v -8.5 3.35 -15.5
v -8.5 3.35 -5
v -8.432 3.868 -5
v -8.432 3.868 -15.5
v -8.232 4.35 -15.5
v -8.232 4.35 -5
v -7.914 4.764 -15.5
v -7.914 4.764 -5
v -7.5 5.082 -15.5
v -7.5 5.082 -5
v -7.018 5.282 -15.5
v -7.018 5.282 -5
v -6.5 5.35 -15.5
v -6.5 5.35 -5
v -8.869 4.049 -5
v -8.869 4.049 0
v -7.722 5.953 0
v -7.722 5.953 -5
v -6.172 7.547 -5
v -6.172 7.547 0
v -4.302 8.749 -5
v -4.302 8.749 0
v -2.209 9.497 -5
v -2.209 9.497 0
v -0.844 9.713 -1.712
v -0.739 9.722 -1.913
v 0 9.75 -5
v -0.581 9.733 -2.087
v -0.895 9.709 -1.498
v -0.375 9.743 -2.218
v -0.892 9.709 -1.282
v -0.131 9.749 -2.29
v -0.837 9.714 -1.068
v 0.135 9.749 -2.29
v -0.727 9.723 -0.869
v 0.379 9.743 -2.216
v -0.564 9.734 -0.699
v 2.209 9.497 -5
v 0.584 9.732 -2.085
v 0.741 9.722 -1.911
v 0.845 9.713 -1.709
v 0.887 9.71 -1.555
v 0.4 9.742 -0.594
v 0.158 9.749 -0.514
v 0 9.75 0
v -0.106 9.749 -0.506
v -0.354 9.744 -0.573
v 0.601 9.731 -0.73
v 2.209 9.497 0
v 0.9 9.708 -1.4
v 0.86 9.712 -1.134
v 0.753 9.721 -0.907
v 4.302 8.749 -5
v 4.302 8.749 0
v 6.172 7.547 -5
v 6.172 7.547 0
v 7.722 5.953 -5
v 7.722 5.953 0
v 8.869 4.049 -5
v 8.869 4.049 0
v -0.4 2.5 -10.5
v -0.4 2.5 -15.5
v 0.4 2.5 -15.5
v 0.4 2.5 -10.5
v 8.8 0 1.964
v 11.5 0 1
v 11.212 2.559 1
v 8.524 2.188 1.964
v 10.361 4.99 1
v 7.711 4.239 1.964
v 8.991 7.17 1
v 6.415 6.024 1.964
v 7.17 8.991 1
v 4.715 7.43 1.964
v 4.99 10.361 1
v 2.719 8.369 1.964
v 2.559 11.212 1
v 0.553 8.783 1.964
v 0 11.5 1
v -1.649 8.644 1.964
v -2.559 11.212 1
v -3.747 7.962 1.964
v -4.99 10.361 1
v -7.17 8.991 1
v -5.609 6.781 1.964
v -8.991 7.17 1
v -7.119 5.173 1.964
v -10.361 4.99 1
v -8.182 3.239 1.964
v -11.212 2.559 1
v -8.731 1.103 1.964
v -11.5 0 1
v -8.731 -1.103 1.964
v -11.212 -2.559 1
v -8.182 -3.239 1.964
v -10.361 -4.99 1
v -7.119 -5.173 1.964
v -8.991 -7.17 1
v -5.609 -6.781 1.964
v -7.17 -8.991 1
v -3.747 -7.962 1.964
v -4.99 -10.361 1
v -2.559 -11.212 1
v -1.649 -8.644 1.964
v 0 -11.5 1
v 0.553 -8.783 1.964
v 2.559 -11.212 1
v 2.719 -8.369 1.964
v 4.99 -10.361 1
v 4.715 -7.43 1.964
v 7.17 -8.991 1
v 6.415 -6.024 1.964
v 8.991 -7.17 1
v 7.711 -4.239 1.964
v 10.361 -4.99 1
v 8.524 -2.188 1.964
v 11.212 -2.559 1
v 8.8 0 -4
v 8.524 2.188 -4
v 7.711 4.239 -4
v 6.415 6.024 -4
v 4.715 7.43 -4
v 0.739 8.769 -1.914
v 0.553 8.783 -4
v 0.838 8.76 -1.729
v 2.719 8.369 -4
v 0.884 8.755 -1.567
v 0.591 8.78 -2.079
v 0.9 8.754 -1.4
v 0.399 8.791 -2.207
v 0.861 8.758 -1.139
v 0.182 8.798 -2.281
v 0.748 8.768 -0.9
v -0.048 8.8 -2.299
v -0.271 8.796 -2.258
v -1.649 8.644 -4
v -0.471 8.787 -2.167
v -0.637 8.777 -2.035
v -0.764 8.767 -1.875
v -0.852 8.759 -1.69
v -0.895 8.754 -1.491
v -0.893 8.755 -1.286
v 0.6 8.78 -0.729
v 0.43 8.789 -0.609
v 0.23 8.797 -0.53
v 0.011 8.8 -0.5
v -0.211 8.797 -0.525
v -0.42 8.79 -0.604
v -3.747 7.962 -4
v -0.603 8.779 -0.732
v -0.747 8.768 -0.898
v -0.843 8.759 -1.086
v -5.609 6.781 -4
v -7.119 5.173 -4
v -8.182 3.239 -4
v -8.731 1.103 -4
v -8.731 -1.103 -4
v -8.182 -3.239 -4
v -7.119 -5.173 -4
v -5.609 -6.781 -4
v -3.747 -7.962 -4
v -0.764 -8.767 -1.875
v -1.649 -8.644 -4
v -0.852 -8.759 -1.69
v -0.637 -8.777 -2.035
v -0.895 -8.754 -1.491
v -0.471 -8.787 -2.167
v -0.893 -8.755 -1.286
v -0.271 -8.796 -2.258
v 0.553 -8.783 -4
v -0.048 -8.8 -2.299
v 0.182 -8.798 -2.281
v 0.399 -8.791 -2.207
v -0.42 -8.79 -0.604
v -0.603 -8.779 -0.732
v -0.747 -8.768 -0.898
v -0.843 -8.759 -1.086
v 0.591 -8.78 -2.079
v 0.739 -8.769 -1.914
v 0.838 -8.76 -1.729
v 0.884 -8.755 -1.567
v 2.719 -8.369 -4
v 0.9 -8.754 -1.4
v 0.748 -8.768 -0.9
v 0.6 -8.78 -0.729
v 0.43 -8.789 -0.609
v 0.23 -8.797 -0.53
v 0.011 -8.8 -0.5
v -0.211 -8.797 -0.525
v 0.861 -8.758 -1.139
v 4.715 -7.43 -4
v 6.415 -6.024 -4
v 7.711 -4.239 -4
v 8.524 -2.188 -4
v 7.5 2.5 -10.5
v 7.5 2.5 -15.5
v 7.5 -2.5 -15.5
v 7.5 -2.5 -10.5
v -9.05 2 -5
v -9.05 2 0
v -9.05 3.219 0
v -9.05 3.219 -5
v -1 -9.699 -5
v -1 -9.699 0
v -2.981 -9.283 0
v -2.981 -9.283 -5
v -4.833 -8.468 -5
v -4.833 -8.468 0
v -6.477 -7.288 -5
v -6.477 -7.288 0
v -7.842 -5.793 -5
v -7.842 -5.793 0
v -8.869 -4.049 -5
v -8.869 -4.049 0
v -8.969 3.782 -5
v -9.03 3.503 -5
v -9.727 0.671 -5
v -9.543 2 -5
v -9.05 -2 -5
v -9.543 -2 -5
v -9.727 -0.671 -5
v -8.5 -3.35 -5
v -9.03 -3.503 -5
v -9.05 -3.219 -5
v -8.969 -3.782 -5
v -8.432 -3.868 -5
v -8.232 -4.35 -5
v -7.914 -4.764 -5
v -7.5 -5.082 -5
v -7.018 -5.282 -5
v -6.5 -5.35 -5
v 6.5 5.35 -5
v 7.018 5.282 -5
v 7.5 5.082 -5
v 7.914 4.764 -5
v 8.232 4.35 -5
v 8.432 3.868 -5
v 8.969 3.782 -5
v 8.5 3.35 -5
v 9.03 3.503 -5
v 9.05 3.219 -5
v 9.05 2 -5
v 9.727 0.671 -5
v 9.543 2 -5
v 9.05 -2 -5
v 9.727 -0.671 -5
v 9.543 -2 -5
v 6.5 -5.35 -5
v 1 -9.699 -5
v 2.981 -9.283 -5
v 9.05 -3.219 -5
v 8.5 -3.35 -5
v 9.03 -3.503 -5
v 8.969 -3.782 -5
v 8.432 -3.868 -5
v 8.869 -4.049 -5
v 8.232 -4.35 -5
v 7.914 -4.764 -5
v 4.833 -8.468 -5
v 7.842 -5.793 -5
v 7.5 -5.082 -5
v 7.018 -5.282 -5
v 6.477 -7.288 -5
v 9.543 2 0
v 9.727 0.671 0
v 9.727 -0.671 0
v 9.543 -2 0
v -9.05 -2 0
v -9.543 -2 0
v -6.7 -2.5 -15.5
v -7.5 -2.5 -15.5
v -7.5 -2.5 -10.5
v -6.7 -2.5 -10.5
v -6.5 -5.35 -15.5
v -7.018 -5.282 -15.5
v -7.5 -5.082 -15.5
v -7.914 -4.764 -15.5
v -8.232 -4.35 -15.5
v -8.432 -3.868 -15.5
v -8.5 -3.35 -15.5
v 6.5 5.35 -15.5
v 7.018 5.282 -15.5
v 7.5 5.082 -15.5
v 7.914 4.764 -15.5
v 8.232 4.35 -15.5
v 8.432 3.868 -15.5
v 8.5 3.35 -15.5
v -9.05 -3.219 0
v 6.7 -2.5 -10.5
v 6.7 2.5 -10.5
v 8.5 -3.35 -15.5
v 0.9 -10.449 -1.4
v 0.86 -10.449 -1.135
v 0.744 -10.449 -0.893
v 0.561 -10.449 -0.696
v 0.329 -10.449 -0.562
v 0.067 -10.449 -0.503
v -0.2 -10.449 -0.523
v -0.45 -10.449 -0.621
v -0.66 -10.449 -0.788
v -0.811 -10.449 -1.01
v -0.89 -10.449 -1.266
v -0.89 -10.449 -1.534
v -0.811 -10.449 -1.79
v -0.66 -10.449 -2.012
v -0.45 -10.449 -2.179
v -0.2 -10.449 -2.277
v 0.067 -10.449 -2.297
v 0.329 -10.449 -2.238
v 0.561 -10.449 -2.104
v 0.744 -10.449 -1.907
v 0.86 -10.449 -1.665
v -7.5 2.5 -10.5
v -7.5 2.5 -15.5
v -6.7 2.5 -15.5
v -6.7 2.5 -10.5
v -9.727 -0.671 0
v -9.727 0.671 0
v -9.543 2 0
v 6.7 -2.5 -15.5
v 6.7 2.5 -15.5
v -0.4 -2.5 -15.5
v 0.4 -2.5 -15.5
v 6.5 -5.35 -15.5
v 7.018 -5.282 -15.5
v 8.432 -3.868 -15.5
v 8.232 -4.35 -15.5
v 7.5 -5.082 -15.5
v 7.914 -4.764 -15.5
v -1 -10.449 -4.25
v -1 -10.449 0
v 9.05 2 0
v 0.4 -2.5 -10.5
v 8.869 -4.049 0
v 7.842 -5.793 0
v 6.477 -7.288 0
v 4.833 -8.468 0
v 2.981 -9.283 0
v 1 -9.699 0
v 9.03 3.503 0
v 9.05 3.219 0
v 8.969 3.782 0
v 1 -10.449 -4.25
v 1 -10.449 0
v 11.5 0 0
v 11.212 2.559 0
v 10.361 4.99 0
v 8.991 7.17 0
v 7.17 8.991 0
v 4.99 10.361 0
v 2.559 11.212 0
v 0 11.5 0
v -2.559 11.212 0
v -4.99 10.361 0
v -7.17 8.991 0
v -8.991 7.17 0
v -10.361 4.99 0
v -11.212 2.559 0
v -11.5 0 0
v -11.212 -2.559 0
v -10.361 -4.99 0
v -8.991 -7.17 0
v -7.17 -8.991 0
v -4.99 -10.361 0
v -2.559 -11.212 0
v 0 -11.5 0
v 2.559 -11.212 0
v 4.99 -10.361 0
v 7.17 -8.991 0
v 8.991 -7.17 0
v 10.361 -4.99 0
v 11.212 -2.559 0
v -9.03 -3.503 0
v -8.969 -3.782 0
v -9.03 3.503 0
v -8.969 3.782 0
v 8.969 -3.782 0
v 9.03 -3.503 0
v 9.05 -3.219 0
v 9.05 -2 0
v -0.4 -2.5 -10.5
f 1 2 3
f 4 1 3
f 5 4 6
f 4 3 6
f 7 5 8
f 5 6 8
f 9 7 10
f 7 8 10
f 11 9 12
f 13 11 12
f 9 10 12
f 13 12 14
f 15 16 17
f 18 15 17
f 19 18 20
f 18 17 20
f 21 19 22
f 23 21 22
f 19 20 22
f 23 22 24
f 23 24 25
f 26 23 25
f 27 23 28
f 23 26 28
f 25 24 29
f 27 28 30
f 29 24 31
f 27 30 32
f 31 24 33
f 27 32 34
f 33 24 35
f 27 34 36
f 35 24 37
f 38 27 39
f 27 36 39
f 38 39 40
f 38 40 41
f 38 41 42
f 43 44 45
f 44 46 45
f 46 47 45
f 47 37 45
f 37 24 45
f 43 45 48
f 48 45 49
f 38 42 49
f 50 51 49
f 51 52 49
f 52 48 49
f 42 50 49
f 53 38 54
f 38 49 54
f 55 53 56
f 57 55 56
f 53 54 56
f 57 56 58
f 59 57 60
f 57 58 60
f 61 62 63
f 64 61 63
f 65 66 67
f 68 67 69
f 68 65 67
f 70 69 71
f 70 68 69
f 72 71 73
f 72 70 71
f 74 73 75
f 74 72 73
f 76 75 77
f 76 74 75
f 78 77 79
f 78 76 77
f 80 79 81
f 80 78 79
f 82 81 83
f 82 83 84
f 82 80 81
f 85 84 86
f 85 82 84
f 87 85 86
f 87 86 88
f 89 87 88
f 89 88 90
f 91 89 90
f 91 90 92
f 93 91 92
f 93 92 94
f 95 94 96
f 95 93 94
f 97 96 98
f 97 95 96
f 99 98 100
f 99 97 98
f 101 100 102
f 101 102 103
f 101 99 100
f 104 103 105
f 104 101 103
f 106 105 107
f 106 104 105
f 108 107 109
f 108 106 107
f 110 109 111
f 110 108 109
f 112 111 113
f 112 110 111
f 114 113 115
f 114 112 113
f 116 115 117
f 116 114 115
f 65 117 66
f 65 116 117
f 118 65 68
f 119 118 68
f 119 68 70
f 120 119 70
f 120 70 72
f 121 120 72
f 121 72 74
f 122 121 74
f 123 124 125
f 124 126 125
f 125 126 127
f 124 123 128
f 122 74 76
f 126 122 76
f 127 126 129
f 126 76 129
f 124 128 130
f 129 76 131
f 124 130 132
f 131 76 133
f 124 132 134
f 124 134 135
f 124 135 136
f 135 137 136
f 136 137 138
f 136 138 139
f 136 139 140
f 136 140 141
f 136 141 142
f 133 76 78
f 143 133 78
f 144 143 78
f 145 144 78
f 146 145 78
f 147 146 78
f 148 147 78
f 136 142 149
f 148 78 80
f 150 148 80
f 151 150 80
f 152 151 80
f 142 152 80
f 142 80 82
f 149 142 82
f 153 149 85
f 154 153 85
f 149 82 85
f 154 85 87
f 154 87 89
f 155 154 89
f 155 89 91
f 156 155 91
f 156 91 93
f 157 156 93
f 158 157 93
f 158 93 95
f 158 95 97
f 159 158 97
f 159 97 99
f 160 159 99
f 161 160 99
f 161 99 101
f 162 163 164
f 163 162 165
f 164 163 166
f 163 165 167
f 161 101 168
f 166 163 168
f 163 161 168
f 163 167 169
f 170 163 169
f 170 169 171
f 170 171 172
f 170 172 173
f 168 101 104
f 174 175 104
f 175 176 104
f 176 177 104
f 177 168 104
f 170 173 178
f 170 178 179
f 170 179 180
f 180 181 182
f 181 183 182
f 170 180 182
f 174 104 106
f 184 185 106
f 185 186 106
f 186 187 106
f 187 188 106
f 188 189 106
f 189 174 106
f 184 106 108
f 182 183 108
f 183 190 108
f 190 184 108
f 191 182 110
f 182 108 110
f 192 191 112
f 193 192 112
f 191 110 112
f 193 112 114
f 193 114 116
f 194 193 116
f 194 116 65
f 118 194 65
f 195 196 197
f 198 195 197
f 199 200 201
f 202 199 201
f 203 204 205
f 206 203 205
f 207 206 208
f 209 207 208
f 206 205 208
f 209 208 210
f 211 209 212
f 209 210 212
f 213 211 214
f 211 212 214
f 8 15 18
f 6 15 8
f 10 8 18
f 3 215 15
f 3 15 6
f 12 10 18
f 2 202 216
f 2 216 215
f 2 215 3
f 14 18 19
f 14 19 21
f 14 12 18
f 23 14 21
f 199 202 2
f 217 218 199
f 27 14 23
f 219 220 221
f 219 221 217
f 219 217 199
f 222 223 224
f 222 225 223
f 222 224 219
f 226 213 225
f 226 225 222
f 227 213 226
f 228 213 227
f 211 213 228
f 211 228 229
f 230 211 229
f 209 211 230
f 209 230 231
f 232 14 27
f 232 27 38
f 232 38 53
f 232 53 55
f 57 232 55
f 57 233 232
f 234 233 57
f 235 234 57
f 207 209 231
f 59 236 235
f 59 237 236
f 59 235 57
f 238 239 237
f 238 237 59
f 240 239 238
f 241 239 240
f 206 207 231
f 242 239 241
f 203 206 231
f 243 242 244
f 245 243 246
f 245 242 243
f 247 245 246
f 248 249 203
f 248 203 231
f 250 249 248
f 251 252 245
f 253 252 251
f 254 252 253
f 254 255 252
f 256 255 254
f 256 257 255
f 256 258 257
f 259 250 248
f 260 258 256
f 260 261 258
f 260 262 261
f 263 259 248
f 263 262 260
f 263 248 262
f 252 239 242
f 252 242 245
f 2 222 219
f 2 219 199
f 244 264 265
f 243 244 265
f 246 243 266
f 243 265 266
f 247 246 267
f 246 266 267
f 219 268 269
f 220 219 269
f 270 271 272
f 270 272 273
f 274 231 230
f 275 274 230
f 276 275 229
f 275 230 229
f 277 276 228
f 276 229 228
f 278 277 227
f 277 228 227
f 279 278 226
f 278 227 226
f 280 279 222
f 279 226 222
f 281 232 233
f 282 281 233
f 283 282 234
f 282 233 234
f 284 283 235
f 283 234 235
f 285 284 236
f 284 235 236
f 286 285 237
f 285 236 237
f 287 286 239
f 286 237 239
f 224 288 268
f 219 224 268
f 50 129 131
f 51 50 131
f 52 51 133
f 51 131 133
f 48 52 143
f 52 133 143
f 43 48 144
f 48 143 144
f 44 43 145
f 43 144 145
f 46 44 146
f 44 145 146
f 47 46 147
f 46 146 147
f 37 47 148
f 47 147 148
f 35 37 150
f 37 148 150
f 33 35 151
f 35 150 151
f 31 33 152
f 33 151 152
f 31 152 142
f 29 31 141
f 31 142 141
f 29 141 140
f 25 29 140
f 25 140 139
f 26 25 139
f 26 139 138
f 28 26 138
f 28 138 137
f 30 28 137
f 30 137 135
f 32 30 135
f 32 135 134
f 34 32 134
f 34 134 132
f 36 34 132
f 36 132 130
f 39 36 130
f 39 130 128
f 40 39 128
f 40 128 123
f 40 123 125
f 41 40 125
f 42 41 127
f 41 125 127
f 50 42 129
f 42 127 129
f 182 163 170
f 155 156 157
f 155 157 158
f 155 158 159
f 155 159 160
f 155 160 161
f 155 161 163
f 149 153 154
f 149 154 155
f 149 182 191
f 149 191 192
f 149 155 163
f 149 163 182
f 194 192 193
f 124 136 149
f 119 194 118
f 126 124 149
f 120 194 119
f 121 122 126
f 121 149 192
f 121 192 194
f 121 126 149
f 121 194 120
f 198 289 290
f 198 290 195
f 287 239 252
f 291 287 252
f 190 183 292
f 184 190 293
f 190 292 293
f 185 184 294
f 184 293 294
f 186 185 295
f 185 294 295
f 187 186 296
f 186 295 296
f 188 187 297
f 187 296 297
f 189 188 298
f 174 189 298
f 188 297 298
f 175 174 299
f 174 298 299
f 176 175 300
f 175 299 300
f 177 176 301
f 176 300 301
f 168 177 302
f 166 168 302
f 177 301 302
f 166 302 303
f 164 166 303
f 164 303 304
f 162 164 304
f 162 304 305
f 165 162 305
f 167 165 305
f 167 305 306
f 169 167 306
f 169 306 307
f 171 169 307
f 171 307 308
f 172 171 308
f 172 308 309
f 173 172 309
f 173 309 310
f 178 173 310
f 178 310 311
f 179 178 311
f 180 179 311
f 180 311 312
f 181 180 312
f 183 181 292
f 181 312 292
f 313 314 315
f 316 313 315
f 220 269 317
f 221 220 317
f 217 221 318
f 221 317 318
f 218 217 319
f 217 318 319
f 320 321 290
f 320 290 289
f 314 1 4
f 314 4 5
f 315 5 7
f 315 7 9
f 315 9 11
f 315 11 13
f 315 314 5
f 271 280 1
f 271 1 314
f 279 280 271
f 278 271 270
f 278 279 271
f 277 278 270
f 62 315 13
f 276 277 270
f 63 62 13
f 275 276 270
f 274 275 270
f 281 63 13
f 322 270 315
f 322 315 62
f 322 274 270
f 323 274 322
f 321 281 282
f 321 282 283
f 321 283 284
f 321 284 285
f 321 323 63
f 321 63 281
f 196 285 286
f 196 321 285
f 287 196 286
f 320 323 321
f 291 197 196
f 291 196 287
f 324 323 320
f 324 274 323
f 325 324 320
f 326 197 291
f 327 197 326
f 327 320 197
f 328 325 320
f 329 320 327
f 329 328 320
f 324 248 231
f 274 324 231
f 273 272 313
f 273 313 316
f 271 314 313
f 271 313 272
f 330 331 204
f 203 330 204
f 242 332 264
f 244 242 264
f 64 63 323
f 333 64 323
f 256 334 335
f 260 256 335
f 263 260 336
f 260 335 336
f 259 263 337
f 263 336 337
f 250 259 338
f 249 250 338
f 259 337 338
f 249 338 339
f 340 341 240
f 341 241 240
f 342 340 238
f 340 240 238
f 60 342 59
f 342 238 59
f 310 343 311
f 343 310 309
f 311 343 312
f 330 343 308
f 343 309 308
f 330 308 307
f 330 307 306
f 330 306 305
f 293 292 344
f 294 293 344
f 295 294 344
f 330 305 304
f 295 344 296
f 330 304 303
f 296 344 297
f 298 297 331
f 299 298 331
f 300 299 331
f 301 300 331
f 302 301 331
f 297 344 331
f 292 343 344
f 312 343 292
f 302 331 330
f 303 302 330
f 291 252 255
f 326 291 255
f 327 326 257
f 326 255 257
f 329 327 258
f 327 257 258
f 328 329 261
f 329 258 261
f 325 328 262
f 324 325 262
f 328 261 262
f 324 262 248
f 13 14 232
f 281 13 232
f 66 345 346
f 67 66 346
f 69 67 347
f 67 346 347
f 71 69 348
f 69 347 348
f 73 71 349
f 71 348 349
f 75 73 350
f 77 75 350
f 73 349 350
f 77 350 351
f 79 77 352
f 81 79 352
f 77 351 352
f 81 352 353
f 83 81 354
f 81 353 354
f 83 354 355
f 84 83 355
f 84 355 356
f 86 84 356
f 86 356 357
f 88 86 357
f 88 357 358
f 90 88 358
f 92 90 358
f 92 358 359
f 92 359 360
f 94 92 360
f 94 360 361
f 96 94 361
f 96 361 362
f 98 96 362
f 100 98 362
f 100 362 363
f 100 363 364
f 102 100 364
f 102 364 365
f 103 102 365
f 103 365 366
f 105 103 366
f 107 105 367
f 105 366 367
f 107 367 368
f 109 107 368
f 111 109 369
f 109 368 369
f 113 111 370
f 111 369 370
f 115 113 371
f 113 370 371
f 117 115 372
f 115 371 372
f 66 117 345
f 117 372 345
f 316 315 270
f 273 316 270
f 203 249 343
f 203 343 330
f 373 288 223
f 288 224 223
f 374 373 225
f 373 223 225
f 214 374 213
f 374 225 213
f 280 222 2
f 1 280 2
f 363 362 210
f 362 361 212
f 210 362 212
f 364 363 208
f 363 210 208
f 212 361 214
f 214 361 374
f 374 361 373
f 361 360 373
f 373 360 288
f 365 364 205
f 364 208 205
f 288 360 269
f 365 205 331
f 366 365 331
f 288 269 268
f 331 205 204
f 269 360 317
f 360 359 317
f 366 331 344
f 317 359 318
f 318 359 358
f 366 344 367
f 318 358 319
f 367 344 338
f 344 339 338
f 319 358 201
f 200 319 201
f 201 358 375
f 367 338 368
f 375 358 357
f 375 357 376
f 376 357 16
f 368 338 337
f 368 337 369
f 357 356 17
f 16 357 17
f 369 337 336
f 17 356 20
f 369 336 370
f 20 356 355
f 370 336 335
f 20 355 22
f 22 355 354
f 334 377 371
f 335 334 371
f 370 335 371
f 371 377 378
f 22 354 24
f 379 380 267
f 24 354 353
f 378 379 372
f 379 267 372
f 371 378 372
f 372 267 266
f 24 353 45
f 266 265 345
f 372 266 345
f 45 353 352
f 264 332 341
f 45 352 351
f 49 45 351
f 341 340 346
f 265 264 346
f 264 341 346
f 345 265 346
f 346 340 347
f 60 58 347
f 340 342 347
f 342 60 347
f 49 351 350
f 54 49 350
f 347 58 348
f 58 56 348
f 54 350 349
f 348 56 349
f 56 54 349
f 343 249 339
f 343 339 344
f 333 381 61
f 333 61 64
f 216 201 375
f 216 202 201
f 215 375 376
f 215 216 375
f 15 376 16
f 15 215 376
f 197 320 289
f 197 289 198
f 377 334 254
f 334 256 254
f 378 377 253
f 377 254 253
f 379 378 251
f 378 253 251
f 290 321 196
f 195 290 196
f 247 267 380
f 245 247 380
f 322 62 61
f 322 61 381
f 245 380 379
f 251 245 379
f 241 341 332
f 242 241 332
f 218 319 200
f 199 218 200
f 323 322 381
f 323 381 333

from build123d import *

# Parameters (mm, degrees)
F0_R      = 11.5
F1_DEPTH  = 2
F3_DEPTH  = 5
F5_DEPTH  = 10.5
F6_W      = 0.8
F6_H      = 5
F7_DEPTH  = 5
F8_R      = 8.8
F9_DEPTH  = 6
F11_R     = 2
F12_SIZE  = 0.75
F13_R     = 0.9
F14_DEPTH = 21.9495823706


# Not quite as in the source:
# - a fillet or chamfer that OpenCascade refuses, or shapes differently, is made with other operations: its cross-section is extruded or revolved along the edge and cut away or added


with BuildPart() as f1:
    # F0 (on Top) → F1 (new body)
    with BuildSketch(Plane.XY):
        Circle(F0_R)
    extrude(amount=F1_DEPTH)

    # F2 (on face) → F3 (join)
    with BuildSketch(Plane(origin=(0, 0, 0), x_dir=(1, 0, 0), z_dir=(0, 0, -1))):
        with BuildLine():
            Line((-9.05, -2), (-9.05, -3.6276714294))
            ThreePointArc((-9.05, -3.6276714294), (0, -9.75), (9.05, -3.6276714294))
            Line((9.05, -3.6276714294), (9.05, -2))
            Line((9.05, -2), (9.05, 2))
            Line((9.05, 2), (9.05, 3.6276714294))
            ThreePointArc((9.05, 3.6276714294), (5.8706571109, 7.7844643416), (1, 9.6985823706))
            Line((1, 9.6985823706), (1, 10.4485823706))
            Line((1, 10.4485823706), (-1, 10.4485823706))
            Line((-1, 10.4485823706), (-1, 9.6985823706))
            ThreePointArc((-1, 9.6985823706), (-5.8706571109, 7.7844643416), (-9.05, 3.6276714294))
            Line((-9.05, 3.6276714294), (-9.05, 2))
            Line((-9.05, 2), (-9.05, -2))
        make_face()
        with BuildLine():
            Line((-9.542667342, -2), (-9.05, -2))
            Line((-9.05, -2), (-9.05, 2))
            Line((-9.05, 2), (-9.542667342, 2))
            ThreePointArc((-9.542667342, 2), (-9.75, 0), (-9.542667342, -2))
        make_face()
        with BuildLine():
            Line((9.05, 2), (9.05, -2))
            Line((9.05, -2), (9.542667342, -2))
            ThreePointArc((9.542667342, -2), (9.75, 0), (9.542667342, 2))
            Line((9.542667342, 2), (9.05, 2))
        make_face()
    extrude(amount=F3_DEPTH)

    # F4 (on face) → F5 (join)
    with BuildSketch(Plane(origin=(0, 0, -5), x_dir=(1, 0, 0), z_dir=(0, 0, -1))):
        with BuildLine():
            Line((6.5, 5.35), (-6.5, 5.35))
            ThreePointArc((-6.5, 5.35), (-7.9142135624, 4.7642135624), (-8.5, 3.35))
            Line((-8.5, 3.35), (-8.5, -3.35))
            ThreePointArc((-8.5, -3.35), (-7.9142135624, -4.7642135624), (-6.5, -5.35))
            Line((-6.5, -5.35), (6.5, -5.35))
            ThreePointArc((6.5, -5.35), (7.9142135624, -4.7642135624), (8.5, -3.35))
            Line((8.5, -3.35), (8.5, 3.35))
            ThreePointArc((8.5, 3.35), (7.9142135624, 4.7642135624), (6.5, 5.35))
        make_face()
    extrude(amount=F5_DEPTH)

    # F6 (on face) → F7 (cut)
    with BuildSketch(Plane(origin=(0, 0, -15.5), x_dir=(1, 0, 0), z_dir=(0, 0, -1))):
        Rectangle(F6_W, F6_H)
        with Locations((-7.1, 0)):
            Rectangle(F6_W, F6_H)
        with Locations((7.1, 0)):
            Rectangle(F6_W, F6_H)
    extrude(amount=-F7_DEPTH, mode=Mode.SUBTRACT)

    # F8 (on face) → F9 (cut)
    with BuildSketch(Plane.XY.offset(2)):
        Circle(F8_R)
    extrude(amount=-F9_DEPTH, mode=Mode.SUBTRACT)

    # F10: chamfer of 2.8 x 1 on 1 edges, made by hand

    # F10_s1 → F10_t2 (revolve, cut)
    with BuildSketch(Plane.XZ):
        Polygon((11.5, 1), (8.7, 2), (11.5, 2), align=None)
    revolve(axis=Axis((0, 0, 2), (0, 0, 1)), mode=Mode.SUBTRACT)

    # F11
    f11_edges = [f1.edges().sort_by_distance(p)[0] for p in [
        (-9.05, 3.627671, -2.5),
        (-9.05, -3.627671, -2.5),
        (9.05, -3.627671, -2.5),
        (9.05, 3.627671, -2.5),
    ]]
    fillet(f11_edges, radius=F11_R)

    # F12
    f12_edges = [f1.edges().sort_by_distance(p)[0] for p in [
        (0, -10.448582, -5),
    ]]
    chamfer(f12_edges, length=F12_SIZE)

    # F13 (on face) → F14 (cut, through all)
    with BuildSketch(Plane.XZ.offset(10.4485823706)):
        with Locations((0, -1.4)):
            Circle(F13_R)
    extrude(amount=-F14_DEPTH, mode=Mode.SUBTRACT)


solid = f1.part
